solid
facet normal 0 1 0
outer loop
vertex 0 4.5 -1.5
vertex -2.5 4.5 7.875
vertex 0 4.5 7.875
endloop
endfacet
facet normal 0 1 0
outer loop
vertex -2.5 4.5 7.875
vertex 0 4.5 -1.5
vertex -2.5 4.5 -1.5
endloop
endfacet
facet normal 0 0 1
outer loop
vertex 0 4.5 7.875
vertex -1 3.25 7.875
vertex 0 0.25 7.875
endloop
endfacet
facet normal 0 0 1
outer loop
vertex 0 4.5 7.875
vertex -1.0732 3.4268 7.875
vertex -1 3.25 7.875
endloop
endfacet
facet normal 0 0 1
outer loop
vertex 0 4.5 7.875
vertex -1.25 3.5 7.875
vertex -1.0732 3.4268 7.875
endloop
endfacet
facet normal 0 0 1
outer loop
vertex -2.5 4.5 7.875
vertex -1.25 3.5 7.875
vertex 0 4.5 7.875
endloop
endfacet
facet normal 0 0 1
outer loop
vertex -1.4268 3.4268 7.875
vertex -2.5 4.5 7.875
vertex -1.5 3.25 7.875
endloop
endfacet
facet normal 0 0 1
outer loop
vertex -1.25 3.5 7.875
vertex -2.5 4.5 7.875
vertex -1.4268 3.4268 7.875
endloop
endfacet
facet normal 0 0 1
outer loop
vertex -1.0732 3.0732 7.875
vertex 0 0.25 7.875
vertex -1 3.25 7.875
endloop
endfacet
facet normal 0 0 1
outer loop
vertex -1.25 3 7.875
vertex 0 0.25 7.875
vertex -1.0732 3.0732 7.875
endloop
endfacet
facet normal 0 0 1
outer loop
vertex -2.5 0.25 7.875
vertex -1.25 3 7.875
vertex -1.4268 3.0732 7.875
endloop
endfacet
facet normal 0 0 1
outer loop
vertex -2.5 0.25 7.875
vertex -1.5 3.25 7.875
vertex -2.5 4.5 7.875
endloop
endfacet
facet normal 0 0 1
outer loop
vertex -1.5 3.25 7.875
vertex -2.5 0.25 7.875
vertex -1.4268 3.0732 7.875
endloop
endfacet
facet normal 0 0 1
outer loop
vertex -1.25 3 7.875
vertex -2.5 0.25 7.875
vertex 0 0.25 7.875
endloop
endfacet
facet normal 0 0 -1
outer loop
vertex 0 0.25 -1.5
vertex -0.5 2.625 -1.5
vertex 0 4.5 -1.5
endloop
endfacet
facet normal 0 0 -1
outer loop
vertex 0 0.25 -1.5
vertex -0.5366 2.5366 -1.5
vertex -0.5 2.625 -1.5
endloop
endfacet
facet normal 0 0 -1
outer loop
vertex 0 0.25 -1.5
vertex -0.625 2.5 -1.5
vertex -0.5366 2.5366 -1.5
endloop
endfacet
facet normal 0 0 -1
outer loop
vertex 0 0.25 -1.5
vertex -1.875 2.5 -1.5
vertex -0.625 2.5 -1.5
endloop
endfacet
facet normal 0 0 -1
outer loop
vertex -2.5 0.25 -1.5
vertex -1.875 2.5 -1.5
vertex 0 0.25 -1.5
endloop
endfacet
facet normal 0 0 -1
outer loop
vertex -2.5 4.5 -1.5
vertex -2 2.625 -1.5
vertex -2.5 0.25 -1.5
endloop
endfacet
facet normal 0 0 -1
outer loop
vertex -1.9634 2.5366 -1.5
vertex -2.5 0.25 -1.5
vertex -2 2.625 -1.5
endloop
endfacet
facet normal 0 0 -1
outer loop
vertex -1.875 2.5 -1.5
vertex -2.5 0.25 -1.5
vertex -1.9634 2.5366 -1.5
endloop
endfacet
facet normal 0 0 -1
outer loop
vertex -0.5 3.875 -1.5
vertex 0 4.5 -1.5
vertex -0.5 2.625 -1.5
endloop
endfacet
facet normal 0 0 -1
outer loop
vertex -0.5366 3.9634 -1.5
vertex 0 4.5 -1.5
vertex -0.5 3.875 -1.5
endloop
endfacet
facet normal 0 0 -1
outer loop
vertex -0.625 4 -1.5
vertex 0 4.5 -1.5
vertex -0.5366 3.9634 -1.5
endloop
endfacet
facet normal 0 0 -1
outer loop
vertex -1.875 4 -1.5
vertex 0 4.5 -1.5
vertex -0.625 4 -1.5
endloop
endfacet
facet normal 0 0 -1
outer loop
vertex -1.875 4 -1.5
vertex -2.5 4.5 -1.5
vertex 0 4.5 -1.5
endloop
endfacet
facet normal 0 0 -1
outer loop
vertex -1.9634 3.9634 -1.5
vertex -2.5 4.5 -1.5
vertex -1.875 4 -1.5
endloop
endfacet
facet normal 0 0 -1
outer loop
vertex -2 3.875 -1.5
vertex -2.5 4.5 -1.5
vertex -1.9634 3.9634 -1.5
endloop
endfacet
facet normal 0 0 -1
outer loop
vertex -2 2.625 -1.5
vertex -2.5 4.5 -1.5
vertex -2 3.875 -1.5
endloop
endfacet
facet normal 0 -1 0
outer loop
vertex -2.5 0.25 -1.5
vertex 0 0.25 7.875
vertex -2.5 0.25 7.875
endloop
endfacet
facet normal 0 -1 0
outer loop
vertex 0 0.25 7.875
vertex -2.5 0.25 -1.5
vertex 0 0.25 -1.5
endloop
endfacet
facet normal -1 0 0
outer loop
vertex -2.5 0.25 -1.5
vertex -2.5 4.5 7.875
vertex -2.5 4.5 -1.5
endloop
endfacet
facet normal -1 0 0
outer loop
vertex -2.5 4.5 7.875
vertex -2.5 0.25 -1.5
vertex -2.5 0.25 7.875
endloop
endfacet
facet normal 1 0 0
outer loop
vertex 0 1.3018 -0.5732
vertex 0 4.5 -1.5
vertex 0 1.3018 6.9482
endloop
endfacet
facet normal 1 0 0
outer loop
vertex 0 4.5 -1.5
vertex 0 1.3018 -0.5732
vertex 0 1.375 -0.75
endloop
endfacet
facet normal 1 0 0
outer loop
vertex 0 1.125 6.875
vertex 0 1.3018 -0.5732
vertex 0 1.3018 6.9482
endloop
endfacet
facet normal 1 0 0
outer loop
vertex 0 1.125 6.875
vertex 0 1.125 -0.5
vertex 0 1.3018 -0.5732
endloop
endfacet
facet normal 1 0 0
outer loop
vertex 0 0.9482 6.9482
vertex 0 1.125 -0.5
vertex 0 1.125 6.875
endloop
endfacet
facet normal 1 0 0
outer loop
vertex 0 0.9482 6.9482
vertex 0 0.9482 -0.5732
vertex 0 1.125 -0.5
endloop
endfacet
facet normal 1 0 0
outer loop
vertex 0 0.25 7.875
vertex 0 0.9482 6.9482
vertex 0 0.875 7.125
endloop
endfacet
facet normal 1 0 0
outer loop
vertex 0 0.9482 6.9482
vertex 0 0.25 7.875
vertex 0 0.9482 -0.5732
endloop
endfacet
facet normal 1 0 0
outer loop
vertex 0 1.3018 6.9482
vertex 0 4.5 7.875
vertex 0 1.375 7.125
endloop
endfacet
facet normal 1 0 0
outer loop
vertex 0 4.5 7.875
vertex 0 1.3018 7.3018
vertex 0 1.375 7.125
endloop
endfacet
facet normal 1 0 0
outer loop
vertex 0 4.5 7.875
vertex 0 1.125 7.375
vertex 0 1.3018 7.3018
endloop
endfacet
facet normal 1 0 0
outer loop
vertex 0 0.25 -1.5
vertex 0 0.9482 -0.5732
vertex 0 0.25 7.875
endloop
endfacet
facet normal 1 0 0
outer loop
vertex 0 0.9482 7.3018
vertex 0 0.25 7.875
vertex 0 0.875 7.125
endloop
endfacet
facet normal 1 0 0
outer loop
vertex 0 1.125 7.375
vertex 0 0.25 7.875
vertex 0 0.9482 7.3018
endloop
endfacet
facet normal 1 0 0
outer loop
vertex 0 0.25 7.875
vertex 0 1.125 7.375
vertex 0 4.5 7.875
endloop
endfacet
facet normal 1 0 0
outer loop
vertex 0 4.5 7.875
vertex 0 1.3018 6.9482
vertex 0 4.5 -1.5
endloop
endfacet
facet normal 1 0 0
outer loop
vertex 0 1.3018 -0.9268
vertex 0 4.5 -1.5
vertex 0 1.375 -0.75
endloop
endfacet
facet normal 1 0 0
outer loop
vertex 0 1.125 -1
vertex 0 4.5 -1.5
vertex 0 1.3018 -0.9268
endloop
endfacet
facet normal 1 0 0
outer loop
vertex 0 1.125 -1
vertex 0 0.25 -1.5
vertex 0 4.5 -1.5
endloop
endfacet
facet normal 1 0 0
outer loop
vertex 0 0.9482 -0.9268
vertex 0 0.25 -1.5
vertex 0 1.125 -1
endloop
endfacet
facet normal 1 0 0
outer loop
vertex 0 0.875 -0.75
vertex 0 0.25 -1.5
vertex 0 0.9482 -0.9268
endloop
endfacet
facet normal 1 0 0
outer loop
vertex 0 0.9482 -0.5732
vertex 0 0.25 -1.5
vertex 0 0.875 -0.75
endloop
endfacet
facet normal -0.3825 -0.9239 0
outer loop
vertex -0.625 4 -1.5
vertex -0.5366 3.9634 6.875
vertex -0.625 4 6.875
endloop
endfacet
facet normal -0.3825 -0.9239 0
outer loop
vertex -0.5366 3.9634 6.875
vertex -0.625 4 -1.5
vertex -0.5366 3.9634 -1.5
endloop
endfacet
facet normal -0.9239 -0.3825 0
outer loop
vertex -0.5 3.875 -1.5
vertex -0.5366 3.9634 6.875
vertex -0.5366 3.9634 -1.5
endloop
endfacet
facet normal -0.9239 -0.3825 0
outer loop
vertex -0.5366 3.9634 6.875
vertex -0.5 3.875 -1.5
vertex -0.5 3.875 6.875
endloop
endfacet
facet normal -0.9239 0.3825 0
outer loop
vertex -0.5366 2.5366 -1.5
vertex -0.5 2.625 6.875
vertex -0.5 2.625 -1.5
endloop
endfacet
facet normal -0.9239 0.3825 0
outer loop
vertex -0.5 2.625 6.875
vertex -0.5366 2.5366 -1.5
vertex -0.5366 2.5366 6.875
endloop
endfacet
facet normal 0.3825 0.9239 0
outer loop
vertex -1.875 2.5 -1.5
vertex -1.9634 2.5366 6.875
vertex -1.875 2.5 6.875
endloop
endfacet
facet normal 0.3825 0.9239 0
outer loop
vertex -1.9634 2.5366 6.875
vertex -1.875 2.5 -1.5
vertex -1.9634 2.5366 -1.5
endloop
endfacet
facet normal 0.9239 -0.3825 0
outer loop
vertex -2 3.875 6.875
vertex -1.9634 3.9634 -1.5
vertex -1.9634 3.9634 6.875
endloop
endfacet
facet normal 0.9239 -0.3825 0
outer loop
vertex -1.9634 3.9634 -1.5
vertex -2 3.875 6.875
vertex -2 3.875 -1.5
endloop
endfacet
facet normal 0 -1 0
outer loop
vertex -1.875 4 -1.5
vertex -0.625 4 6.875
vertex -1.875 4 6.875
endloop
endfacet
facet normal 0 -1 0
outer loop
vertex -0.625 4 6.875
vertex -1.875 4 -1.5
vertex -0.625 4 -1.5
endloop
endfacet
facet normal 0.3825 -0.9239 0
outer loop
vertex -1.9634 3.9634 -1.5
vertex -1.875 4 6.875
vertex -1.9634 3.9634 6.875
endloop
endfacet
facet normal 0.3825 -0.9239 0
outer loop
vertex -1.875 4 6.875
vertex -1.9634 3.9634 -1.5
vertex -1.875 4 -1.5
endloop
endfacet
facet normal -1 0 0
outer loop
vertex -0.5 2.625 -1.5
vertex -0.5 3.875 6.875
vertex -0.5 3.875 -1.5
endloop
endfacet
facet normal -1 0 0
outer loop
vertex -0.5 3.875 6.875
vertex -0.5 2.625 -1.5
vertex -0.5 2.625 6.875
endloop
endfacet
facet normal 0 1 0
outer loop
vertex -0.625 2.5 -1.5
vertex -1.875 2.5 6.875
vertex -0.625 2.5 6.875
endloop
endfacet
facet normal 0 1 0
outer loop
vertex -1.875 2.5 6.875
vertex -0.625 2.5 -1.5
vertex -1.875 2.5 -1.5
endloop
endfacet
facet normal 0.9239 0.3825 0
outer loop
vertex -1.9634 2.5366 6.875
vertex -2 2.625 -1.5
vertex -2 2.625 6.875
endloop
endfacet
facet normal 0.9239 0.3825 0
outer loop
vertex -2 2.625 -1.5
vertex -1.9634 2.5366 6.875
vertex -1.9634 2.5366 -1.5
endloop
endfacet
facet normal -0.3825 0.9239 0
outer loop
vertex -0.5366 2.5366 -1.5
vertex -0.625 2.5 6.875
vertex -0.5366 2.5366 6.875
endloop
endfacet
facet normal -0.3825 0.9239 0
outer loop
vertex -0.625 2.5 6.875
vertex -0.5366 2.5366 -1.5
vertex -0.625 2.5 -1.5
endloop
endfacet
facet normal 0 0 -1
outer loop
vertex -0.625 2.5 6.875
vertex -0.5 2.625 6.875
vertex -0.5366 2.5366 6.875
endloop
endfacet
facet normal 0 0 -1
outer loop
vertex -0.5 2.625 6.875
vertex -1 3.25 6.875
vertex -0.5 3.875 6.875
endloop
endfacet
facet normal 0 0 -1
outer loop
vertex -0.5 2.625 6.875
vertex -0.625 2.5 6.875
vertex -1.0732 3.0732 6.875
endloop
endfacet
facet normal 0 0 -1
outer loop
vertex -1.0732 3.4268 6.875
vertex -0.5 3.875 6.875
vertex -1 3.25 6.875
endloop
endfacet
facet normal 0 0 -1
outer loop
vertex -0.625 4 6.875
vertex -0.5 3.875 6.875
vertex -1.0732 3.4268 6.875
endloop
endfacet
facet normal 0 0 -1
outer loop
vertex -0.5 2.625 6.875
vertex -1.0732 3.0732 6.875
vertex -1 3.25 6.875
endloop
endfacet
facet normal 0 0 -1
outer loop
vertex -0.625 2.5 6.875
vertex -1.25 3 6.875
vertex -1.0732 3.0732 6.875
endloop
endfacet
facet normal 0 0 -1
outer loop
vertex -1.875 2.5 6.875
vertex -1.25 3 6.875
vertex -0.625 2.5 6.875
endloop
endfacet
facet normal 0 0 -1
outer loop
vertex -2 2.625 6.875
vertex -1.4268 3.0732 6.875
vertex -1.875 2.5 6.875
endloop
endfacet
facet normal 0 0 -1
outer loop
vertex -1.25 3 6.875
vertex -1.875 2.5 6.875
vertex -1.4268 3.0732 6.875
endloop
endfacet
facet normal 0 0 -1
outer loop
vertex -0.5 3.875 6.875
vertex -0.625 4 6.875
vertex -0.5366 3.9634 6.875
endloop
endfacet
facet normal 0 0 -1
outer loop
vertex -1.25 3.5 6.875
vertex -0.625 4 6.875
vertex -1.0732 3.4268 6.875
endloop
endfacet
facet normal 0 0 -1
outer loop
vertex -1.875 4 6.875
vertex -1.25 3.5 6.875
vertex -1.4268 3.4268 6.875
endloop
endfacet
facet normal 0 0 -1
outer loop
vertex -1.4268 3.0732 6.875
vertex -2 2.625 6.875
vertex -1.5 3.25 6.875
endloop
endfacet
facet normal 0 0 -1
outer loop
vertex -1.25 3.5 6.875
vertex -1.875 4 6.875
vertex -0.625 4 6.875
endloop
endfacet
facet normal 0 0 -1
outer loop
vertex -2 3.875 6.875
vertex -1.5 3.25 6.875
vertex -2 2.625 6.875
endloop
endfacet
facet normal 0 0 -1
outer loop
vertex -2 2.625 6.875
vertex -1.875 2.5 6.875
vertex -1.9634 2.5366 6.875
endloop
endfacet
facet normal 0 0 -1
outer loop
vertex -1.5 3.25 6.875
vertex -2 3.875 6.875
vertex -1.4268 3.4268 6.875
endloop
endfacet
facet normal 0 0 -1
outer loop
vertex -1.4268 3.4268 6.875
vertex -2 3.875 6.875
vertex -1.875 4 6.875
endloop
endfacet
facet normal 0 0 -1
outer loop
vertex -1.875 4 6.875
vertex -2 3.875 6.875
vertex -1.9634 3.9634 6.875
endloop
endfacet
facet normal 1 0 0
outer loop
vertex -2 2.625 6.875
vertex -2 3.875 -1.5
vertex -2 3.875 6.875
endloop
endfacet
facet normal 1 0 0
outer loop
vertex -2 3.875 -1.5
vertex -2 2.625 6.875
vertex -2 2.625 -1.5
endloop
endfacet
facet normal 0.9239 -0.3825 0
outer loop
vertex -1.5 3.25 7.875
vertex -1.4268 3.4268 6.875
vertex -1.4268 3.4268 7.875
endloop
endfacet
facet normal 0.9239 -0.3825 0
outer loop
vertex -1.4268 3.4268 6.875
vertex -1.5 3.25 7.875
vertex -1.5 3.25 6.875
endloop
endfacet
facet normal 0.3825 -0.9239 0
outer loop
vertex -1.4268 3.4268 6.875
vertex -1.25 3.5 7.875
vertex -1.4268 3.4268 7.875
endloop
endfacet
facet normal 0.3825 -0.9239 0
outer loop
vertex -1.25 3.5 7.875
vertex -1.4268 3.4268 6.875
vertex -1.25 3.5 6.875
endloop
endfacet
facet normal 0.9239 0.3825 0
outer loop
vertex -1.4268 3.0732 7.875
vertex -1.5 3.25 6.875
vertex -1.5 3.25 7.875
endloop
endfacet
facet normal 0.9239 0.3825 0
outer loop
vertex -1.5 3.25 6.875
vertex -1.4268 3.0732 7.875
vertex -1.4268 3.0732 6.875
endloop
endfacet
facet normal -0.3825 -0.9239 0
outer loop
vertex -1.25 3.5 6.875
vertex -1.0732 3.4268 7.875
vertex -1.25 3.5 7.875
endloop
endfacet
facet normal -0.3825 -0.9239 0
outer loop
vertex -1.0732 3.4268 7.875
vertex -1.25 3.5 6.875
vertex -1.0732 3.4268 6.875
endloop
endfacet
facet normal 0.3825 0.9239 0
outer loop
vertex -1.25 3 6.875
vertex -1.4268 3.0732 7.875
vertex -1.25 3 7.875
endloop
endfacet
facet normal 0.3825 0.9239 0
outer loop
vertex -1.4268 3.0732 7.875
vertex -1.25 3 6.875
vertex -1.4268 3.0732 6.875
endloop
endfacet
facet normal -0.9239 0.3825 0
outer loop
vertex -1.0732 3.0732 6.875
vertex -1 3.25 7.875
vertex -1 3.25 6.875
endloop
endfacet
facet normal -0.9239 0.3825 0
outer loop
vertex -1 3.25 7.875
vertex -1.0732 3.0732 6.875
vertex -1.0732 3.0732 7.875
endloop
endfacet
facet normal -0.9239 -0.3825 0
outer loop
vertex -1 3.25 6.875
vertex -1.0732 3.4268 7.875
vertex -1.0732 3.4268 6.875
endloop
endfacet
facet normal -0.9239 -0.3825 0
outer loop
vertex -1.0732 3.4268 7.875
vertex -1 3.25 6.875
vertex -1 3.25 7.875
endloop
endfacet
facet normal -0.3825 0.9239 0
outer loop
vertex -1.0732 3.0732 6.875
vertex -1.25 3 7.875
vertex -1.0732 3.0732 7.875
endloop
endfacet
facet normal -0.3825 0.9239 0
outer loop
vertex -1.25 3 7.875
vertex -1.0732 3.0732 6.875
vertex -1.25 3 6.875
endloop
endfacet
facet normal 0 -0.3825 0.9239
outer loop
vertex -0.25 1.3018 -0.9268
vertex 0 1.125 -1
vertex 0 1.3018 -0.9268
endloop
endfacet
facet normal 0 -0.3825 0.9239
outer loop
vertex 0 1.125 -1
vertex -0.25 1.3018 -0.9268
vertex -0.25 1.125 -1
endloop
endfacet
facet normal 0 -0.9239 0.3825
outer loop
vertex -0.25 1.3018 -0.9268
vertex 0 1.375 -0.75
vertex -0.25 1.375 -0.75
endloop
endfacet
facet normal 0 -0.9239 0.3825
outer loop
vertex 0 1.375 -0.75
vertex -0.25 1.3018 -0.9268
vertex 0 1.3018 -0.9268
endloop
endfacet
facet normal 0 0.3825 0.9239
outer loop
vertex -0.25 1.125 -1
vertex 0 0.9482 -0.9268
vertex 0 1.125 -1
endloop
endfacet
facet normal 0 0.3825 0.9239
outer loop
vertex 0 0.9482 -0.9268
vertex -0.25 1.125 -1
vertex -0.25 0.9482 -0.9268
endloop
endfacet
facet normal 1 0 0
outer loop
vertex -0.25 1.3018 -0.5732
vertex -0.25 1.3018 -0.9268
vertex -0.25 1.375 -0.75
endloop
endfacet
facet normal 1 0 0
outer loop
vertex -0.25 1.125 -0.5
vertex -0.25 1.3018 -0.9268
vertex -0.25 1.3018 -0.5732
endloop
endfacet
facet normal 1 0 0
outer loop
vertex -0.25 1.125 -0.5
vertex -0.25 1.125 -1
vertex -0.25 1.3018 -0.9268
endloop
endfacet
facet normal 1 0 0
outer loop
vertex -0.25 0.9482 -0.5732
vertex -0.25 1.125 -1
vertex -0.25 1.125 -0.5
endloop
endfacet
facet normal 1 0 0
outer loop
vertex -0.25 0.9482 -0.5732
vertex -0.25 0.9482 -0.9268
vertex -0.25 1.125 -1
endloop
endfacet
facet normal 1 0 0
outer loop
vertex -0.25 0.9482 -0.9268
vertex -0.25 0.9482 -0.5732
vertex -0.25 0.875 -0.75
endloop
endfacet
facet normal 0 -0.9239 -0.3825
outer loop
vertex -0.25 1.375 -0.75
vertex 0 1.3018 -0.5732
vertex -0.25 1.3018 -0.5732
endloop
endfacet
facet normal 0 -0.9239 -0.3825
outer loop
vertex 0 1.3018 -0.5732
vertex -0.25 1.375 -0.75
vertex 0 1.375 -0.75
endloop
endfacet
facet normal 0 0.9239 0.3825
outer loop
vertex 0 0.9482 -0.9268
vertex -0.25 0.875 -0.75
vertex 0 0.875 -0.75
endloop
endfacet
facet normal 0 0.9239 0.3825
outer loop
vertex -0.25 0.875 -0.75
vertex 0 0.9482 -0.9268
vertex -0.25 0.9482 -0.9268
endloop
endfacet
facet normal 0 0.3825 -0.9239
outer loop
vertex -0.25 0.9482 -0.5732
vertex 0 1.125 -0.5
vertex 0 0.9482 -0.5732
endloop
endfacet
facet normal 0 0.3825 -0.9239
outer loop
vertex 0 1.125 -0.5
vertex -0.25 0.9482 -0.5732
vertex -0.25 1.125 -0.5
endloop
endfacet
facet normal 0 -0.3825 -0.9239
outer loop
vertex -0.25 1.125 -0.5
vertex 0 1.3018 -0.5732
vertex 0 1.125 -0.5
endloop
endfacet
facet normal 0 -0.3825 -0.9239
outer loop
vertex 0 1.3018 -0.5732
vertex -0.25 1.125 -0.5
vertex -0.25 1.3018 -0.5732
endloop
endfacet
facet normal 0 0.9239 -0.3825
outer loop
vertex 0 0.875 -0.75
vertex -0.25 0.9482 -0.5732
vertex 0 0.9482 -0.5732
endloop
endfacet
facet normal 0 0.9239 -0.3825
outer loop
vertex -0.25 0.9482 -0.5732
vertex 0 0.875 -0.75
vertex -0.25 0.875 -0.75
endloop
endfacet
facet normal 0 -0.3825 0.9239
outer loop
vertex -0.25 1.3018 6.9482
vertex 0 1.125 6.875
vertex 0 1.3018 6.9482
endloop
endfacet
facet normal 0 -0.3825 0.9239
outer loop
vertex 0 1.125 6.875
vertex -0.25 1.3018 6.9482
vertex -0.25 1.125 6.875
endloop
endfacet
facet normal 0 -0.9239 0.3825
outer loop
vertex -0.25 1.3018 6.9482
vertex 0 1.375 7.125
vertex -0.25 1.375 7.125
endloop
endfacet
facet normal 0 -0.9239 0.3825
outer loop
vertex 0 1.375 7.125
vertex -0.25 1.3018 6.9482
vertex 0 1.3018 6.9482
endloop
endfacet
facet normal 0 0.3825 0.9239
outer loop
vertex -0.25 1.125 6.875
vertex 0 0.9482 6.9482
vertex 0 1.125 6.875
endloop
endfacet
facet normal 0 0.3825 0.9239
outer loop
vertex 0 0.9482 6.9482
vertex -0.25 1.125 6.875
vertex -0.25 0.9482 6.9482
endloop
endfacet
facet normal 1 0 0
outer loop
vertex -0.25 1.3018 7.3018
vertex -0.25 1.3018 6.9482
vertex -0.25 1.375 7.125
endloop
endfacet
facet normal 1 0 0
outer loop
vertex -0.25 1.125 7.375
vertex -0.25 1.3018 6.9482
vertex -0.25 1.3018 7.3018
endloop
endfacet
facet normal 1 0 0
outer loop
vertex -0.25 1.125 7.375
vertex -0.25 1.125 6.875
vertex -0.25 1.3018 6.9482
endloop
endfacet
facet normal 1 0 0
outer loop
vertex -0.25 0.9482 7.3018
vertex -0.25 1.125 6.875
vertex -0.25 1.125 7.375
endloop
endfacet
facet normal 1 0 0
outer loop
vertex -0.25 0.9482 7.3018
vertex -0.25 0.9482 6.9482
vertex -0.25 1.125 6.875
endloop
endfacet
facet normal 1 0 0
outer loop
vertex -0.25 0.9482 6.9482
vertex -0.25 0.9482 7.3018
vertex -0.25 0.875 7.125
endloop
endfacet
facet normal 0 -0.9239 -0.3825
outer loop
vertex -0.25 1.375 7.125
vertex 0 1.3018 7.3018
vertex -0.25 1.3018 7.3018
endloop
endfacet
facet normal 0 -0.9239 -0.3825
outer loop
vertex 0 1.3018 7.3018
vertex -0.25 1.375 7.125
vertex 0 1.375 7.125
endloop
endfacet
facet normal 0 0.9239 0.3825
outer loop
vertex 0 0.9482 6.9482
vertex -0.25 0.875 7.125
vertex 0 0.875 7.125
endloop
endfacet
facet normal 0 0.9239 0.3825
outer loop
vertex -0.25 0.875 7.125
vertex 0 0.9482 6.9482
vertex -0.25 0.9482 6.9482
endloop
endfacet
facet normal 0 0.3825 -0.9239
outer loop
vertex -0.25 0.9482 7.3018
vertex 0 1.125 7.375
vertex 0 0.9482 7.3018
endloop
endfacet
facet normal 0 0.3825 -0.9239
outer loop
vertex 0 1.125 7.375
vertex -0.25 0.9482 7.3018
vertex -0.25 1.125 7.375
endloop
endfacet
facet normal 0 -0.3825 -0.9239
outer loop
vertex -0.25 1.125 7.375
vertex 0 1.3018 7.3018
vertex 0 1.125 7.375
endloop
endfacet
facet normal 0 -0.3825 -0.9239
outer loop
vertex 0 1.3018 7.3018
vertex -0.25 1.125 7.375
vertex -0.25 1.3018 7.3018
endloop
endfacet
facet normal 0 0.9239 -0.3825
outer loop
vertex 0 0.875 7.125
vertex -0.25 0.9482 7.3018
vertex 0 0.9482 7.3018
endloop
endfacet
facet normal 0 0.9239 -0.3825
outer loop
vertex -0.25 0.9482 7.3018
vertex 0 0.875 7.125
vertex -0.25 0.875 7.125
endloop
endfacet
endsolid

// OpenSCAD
// file: TTvars.scad
$fn=8; //default 36

//flat bar
barX=0.25;
barZ=6;
barLY=108;
barLX=60;

//angle iron
angX=1.5;
angT=0.125;
angLY=barLY;
angLX=barLX;
angR=0.25;

//square tubing
cornerSQ=1.5; //size of square tubing in corners
cornerSQr=0.125; //radius of square tubing 90s
cornerT=0.5; //thickness of corner mount walls
cornerBoltOD=0.5;


boltD=0.5;      //main mounting bolt diameter
boltL=1.968504;  

brrOD=0.875;
brrID=0.375;
brrT=0.28125;

sprOD=0.25; //spring? i dont remember wha this is

bmountGap=0.125;
bmountbrrGap=0.125;

//stepper
stepBoltD=0.11811024;  //3.0mm bolt diameter
stepBoltHD=0.22362205; //5.68mm head diameter
stepBoltHH=0.11811024;  //3.0mm head height
stepBoltX=1.22047244;   //31.0mm square from bolt center to center
stepBoltIn=0.15748031;  //4.0mm bolt depth into stepper
stepSeatD=0.86614173;    //22.0mm
stepSeatH=0.07874016;    //2.0mm
stepX=1.66535433;        //42.3mm stepper square face 
stepBoreD=0.2007874;     //5.1mm shaft bore
stepBoreL=0.787402;    //20mm

//pully
pullP=1.253;       //OD of belt around pully GT2 20T ??
pullH=0.25;            //Height of pulley ?????
pullS=0.125;           //pully space

//calculated

Y2Y=barLX+0.0;
Y2YA=Y2Y+(((((barX+(bmountGap*2)))/2)+0.5)*2); //center to center barL
X2X=8; //distance between X rails

bmountX=max((barX+(bmountGap*2)+(stepX*2)),(barX+((brrOD+1)*2)));
// max(barX+(bmountGap*2)+(stepX*2),barX+((brrOD+1)*2))
bmountY=X2X;
bmountZ=barZ+(1+boltD)+(brrOD/2)+(brrID/2)+(0.25)+boltD+(0.5);

xmountX=((bmountX-(barX+(bmountGap*2)))/2)+0;
xmountY=angX+barX+1.0;
// main file
include <TTvars.scad>;

TTcorner();

module TTcorner(){
rotate([0,0,90])
difference(){    
translate([(barX+(bmountGap*2))/2,0,-(1+boltD)]) {
difference(){    
cube([((bmountX-(barX+(bmountGap*2)))/2)+(cornerSQ+(cornerT*2)),cornerSQ+(cornerT*2),bmountZ]);    

//square tubing hole
translate([(-(cornerSQ-(cornerSQr*2))/2)+((bmountX-(barX+(bmountGap*2)))/2)+((cornerSQ+(cornerT*2))/2),(cornerSQ-(cornerSQr*2))/2,bmountZ-1])
mirror([0,0,1])    
minkowski(){
    cube([cornerSQ-(cornerSQr*2),cornerSQ-(cornerSQr*2),bmountZ]);
    cylinder(r=cornerSQr, h=1);
}//end minkoski
//corner bolt hole
translate([(((cornerSQ-(cornerSQr*2))/2)-(cornerSQ-(cornerSQr*2))/2)+((bmountX-(barX+(bmountGap*2)))/2)+((cornerSQ+(cornerT*2))/2),(cornerSQ-(cornerSQr*2)),bmountZ-1])
cylinder(d=cornerBoltOD, h=1);

}//end difference
}//end translate

//lower attach hole
translate([bmountX-(((bmountX-(barX+(bmountGap*2)))/2)/2)-(bmountX/2),-(angX+0.75),-(1+boltD)/2])
rotate([-90,0,0])
    cylinder(d=boltD, h=(cornerSQ+(cornerT*2)));
//upper attach hole
translate([bmountX-(((bmountX-(barX+(bmountGap*2)))/2)/2)-(bmountX/2),-(angX+0.75),barZ+(brrOD/2)+(brrID/2)+(0.25)+(boltD/2)])
rotate([-90,0,0])
    cylinder(d=boltD, h=(cornerSQ+(cornerT*2)));


    
    

} //end difference
} //end TTcorner
